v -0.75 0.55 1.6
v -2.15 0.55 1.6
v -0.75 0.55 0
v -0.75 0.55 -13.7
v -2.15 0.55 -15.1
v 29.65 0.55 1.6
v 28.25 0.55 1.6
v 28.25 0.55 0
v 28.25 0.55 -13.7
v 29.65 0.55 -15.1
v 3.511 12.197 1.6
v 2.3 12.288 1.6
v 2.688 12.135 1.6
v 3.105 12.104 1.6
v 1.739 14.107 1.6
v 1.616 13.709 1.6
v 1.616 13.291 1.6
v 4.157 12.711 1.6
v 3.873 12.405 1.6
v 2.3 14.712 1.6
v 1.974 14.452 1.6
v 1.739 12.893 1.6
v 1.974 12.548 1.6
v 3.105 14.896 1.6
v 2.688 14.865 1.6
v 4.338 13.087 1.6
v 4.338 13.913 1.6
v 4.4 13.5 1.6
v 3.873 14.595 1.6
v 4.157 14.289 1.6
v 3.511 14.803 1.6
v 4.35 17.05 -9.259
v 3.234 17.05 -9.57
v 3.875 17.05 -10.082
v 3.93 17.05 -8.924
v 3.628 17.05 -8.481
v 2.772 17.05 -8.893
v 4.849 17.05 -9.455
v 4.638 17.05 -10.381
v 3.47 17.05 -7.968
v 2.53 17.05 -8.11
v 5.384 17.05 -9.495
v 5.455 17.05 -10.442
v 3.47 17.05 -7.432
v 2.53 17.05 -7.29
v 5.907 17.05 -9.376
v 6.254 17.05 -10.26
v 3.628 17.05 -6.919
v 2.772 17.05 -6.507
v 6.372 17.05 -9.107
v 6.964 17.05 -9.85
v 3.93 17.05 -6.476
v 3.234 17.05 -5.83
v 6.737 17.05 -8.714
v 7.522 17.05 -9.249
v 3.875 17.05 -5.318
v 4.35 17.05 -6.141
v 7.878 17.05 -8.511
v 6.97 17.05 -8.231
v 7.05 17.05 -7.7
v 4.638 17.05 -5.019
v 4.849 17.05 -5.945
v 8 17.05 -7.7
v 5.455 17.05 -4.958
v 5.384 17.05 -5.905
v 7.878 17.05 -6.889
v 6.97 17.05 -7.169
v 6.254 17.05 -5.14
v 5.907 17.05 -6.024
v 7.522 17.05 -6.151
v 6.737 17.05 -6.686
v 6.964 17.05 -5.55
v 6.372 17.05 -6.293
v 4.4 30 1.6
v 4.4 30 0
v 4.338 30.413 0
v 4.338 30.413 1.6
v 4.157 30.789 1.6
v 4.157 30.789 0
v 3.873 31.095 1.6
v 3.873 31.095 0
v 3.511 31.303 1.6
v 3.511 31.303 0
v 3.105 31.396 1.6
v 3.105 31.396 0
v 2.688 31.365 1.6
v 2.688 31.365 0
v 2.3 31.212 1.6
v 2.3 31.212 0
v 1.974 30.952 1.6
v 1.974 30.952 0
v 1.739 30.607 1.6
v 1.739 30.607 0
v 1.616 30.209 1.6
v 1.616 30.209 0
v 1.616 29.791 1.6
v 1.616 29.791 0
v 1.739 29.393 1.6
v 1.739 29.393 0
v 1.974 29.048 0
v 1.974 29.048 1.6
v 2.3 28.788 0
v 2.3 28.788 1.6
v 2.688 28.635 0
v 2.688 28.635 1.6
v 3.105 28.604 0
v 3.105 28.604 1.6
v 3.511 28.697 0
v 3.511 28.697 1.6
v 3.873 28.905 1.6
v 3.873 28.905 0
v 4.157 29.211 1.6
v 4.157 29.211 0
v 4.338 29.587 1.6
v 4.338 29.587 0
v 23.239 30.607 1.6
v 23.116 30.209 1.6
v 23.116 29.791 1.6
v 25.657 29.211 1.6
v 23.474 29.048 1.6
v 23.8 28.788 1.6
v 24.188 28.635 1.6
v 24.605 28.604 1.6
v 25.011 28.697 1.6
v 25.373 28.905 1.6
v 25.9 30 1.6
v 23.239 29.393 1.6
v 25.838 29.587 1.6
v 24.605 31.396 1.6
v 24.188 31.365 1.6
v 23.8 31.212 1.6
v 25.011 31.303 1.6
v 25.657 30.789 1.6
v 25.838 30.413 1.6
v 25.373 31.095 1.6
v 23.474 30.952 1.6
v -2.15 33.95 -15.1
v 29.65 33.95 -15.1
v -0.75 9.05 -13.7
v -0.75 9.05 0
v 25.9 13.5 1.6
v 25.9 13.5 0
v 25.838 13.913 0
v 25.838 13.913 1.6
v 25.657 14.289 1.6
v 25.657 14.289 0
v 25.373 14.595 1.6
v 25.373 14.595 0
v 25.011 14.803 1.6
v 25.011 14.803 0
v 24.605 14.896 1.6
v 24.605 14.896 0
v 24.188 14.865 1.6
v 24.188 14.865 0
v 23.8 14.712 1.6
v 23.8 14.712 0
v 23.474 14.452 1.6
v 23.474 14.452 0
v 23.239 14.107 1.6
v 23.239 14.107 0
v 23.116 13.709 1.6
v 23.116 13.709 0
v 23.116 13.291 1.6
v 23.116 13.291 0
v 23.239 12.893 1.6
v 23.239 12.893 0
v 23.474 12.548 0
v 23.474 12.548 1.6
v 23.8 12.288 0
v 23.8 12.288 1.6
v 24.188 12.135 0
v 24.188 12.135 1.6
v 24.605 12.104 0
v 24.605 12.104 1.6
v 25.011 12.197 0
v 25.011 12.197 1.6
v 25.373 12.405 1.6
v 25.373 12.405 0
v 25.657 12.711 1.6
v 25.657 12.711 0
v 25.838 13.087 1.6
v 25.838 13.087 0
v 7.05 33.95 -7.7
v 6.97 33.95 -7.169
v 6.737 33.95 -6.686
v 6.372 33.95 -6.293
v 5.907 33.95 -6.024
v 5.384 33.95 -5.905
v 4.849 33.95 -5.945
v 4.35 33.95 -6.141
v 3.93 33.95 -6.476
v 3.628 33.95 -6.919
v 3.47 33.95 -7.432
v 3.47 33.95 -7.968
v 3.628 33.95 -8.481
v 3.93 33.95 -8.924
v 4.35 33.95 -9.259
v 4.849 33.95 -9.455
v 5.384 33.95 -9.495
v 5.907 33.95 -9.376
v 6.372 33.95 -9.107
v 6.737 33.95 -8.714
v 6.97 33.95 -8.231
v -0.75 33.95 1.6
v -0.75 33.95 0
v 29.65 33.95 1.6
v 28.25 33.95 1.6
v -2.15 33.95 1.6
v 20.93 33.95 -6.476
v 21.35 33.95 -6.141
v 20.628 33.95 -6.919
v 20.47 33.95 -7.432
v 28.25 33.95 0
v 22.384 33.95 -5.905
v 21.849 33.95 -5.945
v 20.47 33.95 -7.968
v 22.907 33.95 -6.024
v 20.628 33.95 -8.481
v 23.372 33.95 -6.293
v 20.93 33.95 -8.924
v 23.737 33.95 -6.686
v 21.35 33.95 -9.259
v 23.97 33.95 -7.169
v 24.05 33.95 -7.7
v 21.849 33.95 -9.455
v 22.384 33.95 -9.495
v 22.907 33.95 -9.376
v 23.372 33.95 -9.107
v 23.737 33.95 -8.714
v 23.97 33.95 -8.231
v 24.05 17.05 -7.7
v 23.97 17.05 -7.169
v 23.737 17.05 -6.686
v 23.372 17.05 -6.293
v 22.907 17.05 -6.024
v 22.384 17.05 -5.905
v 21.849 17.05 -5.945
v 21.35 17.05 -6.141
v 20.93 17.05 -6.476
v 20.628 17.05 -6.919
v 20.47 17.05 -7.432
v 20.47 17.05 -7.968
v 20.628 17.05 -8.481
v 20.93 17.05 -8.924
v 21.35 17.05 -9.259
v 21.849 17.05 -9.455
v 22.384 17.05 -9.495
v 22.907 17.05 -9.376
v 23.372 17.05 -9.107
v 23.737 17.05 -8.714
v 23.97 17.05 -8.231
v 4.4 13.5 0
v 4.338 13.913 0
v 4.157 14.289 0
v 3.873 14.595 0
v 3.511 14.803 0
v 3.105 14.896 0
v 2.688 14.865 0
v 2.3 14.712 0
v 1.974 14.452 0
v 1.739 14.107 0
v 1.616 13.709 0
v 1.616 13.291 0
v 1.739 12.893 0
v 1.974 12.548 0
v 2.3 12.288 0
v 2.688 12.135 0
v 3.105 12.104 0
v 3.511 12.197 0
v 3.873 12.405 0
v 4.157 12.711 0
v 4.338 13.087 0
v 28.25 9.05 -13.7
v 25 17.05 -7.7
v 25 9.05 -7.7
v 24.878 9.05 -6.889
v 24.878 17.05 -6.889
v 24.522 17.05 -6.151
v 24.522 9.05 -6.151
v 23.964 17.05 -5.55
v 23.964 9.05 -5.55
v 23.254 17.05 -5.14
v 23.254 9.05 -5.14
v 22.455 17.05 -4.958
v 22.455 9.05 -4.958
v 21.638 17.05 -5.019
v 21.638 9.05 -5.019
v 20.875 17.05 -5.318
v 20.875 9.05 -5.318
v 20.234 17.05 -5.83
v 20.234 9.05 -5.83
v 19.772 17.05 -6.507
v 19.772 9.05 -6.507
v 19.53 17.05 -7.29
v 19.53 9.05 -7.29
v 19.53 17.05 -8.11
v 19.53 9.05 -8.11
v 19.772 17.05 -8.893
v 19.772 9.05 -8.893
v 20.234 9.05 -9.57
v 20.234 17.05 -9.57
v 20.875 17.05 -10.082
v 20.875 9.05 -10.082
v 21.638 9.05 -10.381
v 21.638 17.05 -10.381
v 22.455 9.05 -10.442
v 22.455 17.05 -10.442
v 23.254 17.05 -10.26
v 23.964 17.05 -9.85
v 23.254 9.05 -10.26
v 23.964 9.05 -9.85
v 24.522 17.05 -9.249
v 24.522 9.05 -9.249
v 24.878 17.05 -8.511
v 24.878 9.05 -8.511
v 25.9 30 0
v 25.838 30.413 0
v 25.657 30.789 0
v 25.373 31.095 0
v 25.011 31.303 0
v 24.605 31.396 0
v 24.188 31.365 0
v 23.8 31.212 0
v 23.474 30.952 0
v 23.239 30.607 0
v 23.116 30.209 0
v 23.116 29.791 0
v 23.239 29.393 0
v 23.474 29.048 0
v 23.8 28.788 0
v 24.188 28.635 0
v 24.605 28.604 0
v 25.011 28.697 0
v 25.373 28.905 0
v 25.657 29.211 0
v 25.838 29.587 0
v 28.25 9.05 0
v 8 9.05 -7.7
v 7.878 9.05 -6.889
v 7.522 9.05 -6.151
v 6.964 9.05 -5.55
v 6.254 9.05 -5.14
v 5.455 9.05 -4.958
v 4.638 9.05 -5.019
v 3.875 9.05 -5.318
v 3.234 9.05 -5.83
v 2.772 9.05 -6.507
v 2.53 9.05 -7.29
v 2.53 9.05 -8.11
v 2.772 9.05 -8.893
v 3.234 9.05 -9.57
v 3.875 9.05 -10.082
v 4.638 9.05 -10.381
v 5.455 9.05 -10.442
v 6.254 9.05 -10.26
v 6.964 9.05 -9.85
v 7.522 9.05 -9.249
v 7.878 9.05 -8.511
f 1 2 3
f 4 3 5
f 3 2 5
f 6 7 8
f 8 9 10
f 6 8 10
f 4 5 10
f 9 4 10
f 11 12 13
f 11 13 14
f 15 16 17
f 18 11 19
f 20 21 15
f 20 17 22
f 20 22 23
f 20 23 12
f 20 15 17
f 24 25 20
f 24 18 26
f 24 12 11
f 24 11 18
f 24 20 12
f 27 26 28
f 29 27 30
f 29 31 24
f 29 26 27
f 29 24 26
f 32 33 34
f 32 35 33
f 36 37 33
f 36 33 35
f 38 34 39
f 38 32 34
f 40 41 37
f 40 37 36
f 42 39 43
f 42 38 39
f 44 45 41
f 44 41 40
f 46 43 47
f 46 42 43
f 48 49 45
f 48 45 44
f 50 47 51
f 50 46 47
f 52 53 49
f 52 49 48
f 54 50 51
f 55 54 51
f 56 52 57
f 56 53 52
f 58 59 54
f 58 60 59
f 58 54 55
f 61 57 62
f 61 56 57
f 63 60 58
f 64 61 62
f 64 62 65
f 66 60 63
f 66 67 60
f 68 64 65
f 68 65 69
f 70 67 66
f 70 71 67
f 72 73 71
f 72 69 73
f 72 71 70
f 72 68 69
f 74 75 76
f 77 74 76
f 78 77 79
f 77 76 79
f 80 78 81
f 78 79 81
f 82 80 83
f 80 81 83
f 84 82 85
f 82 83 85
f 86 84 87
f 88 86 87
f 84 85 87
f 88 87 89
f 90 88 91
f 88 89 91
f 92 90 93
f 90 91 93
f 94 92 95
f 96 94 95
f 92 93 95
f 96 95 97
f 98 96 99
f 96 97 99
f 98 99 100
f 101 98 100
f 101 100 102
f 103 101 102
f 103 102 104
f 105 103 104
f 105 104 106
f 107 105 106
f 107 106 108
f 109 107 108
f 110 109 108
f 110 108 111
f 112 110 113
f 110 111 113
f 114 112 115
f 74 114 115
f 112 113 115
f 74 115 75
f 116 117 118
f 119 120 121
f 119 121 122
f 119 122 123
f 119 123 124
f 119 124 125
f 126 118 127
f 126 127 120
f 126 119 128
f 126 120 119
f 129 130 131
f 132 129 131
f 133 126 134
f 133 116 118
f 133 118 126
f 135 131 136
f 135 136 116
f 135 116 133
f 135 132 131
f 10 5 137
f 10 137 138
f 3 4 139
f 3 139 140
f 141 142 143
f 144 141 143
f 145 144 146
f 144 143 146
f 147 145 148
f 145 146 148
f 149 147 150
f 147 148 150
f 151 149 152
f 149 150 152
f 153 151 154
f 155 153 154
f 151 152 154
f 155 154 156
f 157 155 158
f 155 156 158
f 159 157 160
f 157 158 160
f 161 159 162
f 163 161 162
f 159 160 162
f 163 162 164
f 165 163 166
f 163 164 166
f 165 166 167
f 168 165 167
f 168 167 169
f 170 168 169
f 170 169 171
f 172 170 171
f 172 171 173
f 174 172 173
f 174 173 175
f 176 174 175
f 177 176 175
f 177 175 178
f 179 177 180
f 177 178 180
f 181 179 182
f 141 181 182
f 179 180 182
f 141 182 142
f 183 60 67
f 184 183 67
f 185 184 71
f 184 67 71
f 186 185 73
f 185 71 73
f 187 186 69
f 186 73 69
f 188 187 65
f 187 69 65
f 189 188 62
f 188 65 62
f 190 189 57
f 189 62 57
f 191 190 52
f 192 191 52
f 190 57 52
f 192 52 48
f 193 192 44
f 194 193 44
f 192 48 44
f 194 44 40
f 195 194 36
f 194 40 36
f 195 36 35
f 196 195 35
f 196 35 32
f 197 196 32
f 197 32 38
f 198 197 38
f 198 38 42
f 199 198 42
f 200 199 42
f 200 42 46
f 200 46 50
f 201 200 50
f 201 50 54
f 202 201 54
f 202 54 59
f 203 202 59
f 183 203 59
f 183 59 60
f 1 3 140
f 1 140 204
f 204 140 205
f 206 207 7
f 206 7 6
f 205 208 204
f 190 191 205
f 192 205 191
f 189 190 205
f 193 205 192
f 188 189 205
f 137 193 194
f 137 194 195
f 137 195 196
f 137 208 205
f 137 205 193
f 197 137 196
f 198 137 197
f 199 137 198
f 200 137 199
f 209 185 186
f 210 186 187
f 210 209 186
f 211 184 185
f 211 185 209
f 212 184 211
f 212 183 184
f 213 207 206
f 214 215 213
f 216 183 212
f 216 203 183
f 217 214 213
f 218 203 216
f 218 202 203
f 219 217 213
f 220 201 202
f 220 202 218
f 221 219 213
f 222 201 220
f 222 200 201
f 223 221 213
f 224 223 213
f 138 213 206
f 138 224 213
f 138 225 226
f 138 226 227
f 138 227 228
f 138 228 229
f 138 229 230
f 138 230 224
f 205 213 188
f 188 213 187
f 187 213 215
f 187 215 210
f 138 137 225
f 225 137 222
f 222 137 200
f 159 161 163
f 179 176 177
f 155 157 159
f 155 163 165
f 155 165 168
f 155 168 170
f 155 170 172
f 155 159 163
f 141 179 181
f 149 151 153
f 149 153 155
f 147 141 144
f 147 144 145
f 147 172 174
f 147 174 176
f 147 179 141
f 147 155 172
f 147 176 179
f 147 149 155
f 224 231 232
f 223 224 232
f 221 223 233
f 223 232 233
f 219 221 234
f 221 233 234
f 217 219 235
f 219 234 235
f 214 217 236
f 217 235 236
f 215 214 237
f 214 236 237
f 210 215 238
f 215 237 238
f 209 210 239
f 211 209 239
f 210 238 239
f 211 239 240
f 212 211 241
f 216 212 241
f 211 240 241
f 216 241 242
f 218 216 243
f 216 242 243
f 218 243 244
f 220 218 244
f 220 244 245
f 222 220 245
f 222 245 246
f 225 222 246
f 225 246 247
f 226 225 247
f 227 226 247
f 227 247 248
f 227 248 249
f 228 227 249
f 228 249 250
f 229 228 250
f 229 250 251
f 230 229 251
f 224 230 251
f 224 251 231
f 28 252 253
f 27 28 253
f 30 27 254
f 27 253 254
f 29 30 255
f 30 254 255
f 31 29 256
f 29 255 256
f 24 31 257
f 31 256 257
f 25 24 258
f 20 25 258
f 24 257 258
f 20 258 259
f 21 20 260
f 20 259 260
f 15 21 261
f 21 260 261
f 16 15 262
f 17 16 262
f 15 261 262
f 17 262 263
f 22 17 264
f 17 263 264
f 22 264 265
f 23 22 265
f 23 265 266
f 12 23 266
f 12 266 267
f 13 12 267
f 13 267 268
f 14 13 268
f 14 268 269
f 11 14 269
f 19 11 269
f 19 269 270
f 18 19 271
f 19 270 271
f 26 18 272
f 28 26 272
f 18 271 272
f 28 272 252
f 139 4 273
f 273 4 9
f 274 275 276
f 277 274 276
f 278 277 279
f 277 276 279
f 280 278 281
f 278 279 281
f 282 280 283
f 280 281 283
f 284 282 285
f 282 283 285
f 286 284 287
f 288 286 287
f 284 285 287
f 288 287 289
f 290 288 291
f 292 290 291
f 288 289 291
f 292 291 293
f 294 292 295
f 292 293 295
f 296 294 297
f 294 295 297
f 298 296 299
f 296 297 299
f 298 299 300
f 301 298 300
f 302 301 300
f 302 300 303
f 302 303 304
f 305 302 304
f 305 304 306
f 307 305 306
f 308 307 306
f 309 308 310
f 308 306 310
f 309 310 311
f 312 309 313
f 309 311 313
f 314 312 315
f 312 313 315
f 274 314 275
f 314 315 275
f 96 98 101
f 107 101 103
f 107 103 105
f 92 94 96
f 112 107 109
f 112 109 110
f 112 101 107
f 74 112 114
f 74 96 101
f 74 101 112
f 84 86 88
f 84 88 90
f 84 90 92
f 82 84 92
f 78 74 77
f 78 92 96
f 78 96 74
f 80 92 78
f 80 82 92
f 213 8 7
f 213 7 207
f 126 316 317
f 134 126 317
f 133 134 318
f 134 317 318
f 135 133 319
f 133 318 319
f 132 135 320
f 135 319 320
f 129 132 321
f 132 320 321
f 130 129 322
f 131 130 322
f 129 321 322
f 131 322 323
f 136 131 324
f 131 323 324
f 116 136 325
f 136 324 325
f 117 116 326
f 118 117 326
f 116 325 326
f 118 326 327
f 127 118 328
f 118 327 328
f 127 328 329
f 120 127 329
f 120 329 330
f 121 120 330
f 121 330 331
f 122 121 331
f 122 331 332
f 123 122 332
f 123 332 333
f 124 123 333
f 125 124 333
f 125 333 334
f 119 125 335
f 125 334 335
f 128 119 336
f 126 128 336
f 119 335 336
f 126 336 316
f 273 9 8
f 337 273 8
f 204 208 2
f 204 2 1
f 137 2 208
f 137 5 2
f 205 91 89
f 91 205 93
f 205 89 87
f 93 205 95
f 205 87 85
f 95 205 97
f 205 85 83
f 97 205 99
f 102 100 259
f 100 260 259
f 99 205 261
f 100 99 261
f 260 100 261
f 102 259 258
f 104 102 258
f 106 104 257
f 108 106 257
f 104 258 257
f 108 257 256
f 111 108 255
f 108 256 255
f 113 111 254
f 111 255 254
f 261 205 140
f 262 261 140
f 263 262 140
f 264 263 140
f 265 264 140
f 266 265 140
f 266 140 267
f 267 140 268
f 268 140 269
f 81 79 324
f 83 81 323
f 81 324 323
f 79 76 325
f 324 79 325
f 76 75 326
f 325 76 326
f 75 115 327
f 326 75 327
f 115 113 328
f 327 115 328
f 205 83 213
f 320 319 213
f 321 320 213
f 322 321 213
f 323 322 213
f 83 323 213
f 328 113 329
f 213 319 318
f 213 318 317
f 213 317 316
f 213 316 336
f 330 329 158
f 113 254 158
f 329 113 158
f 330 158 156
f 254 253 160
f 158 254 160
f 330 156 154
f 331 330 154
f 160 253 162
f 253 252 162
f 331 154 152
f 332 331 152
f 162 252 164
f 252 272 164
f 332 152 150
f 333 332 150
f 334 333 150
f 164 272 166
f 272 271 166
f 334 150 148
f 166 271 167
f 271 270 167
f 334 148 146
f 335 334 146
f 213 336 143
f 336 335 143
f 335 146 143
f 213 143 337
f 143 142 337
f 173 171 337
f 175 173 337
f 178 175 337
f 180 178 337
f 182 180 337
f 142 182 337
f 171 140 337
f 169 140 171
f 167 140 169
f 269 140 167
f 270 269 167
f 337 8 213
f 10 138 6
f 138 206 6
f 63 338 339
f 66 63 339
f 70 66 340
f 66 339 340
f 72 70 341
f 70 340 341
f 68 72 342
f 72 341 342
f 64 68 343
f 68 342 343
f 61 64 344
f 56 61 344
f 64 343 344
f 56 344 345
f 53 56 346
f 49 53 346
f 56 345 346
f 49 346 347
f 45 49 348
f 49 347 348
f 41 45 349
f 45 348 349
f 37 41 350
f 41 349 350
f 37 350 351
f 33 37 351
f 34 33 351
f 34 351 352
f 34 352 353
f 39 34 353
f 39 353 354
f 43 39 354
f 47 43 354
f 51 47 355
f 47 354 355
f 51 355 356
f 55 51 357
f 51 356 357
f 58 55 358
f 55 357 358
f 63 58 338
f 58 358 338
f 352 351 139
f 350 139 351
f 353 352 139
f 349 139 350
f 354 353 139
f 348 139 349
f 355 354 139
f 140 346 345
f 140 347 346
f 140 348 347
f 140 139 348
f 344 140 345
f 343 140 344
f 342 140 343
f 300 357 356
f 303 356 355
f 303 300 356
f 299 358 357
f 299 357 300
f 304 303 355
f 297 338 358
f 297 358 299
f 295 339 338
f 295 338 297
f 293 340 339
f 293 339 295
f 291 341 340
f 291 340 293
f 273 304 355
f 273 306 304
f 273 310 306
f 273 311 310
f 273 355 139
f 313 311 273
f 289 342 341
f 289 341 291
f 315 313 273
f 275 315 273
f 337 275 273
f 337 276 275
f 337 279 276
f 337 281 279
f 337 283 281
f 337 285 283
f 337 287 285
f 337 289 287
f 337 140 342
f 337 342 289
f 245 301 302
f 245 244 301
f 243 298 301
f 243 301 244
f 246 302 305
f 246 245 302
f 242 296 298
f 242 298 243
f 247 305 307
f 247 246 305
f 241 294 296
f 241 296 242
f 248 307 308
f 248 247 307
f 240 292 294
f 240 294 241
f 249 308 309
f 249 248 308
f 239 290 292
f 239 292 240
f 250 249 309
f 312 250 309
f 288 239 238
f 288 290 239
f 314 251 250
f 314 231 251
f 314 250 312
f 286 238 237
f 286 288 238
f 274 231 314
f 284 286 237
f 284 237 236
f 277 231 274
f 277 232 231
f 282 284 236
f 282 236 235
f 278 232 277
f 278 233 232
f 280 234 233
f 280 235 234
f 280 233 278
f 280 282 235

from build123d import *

# Parameters (mm, degrees)
SKETCH_W        = 31.8
SKETCH_H        = 33.4
PAD_DEPTH       = 15.1
SKETCH001_R     = 1.4
SKETCH001_W     = 1.4
SKETCH001_H     = 33.4
PAD001_DEPTH    = 1.6
SKETCH002_W     = 29
SKETCH002_H     = 13.7
POCKET_DEPTH    = 8.5
SKETCH011_R     = 2.75
POCKET006_DEPTH = 8
SKETCH012_R     = 1.8
POCKET007_DEPTH = 20


with BuildPart() as part:
    # Sketch (on Face1449 of Binder) → Pad (new body)
    with BuildSketch(Plane(origin=(0, 0, 0), x_dir=(1, 0, 0), z_dir=(0, 0, -1))):
        with Locations((13.749781, -17.25)):
            Rectangle(SKETCH_W, SKETCH_H)
    extrude(amount=PAD_DEPTH)

    # Sketch001 (on Face5 of Pad) → Pad001 (join)
    with BuildSketch(Plane.XY):
        with Locations((3, 30)):
            Circle(SKETCH001_R)
        with Locations((24.5, 30)):
            Circle(SKETCH001_R)
        with Locations((3, 13.5)):
            Circle(SKETCH001_R)
        with Locations((24.5, 13.5)):
            Circle(SKETCH001_R)
        with Locations((-1.450219, 17.25)):
            Rectangle(SKETCH001_W, SKETCH001_H)
        with Locations((28.949781, 17.25)):
            Rectangle(SKETCH001_W, SKETCH001_H)
    extrude(amount=PAD001_DEPTH)

    # Sketch002 (on Face16 of Pad001) → Pocket (cut)
    with BuildSketch(Plane.XZ.offset(-0.55)):
        with Locations((13.74978, -6.85)):
            Rectangle(SKETCH002_W, SKETCH002_H)
    extrude(amount=-POCKET_DEPTH, mode=Mode.SUBTRACT)

    # Sketch011 (on Face10 of Pocket) → Pocket006 (cut)
    with BuildSketch(Plane.XZ.offset(-9.05)):
        with Locations((5.24978, -7.7)):
            Circle(SKETCH011_R)
        with Locations((22.24978, -7.7)):
            Circle(SKETCH011_R)
    extrude(amount=-POCKET006_DEPTH, mode=Mode.SUBTRACT)

    # Sketch012 (on Face19 of Pocket006) → Pocket007 (cut)
    with BuildSketch(Plane.XZ.offset(-17.05)):
        with Locations((5.24978, -7.7)):
            Circle(SKETCH012_R)
        with Locations((22.24978, -7.7)):
            Circle(SKETCH012_R)
    extrude(amount=-POCKET007_DEPTH, mode=Mode.SUBTRACT)


solid = part.part
